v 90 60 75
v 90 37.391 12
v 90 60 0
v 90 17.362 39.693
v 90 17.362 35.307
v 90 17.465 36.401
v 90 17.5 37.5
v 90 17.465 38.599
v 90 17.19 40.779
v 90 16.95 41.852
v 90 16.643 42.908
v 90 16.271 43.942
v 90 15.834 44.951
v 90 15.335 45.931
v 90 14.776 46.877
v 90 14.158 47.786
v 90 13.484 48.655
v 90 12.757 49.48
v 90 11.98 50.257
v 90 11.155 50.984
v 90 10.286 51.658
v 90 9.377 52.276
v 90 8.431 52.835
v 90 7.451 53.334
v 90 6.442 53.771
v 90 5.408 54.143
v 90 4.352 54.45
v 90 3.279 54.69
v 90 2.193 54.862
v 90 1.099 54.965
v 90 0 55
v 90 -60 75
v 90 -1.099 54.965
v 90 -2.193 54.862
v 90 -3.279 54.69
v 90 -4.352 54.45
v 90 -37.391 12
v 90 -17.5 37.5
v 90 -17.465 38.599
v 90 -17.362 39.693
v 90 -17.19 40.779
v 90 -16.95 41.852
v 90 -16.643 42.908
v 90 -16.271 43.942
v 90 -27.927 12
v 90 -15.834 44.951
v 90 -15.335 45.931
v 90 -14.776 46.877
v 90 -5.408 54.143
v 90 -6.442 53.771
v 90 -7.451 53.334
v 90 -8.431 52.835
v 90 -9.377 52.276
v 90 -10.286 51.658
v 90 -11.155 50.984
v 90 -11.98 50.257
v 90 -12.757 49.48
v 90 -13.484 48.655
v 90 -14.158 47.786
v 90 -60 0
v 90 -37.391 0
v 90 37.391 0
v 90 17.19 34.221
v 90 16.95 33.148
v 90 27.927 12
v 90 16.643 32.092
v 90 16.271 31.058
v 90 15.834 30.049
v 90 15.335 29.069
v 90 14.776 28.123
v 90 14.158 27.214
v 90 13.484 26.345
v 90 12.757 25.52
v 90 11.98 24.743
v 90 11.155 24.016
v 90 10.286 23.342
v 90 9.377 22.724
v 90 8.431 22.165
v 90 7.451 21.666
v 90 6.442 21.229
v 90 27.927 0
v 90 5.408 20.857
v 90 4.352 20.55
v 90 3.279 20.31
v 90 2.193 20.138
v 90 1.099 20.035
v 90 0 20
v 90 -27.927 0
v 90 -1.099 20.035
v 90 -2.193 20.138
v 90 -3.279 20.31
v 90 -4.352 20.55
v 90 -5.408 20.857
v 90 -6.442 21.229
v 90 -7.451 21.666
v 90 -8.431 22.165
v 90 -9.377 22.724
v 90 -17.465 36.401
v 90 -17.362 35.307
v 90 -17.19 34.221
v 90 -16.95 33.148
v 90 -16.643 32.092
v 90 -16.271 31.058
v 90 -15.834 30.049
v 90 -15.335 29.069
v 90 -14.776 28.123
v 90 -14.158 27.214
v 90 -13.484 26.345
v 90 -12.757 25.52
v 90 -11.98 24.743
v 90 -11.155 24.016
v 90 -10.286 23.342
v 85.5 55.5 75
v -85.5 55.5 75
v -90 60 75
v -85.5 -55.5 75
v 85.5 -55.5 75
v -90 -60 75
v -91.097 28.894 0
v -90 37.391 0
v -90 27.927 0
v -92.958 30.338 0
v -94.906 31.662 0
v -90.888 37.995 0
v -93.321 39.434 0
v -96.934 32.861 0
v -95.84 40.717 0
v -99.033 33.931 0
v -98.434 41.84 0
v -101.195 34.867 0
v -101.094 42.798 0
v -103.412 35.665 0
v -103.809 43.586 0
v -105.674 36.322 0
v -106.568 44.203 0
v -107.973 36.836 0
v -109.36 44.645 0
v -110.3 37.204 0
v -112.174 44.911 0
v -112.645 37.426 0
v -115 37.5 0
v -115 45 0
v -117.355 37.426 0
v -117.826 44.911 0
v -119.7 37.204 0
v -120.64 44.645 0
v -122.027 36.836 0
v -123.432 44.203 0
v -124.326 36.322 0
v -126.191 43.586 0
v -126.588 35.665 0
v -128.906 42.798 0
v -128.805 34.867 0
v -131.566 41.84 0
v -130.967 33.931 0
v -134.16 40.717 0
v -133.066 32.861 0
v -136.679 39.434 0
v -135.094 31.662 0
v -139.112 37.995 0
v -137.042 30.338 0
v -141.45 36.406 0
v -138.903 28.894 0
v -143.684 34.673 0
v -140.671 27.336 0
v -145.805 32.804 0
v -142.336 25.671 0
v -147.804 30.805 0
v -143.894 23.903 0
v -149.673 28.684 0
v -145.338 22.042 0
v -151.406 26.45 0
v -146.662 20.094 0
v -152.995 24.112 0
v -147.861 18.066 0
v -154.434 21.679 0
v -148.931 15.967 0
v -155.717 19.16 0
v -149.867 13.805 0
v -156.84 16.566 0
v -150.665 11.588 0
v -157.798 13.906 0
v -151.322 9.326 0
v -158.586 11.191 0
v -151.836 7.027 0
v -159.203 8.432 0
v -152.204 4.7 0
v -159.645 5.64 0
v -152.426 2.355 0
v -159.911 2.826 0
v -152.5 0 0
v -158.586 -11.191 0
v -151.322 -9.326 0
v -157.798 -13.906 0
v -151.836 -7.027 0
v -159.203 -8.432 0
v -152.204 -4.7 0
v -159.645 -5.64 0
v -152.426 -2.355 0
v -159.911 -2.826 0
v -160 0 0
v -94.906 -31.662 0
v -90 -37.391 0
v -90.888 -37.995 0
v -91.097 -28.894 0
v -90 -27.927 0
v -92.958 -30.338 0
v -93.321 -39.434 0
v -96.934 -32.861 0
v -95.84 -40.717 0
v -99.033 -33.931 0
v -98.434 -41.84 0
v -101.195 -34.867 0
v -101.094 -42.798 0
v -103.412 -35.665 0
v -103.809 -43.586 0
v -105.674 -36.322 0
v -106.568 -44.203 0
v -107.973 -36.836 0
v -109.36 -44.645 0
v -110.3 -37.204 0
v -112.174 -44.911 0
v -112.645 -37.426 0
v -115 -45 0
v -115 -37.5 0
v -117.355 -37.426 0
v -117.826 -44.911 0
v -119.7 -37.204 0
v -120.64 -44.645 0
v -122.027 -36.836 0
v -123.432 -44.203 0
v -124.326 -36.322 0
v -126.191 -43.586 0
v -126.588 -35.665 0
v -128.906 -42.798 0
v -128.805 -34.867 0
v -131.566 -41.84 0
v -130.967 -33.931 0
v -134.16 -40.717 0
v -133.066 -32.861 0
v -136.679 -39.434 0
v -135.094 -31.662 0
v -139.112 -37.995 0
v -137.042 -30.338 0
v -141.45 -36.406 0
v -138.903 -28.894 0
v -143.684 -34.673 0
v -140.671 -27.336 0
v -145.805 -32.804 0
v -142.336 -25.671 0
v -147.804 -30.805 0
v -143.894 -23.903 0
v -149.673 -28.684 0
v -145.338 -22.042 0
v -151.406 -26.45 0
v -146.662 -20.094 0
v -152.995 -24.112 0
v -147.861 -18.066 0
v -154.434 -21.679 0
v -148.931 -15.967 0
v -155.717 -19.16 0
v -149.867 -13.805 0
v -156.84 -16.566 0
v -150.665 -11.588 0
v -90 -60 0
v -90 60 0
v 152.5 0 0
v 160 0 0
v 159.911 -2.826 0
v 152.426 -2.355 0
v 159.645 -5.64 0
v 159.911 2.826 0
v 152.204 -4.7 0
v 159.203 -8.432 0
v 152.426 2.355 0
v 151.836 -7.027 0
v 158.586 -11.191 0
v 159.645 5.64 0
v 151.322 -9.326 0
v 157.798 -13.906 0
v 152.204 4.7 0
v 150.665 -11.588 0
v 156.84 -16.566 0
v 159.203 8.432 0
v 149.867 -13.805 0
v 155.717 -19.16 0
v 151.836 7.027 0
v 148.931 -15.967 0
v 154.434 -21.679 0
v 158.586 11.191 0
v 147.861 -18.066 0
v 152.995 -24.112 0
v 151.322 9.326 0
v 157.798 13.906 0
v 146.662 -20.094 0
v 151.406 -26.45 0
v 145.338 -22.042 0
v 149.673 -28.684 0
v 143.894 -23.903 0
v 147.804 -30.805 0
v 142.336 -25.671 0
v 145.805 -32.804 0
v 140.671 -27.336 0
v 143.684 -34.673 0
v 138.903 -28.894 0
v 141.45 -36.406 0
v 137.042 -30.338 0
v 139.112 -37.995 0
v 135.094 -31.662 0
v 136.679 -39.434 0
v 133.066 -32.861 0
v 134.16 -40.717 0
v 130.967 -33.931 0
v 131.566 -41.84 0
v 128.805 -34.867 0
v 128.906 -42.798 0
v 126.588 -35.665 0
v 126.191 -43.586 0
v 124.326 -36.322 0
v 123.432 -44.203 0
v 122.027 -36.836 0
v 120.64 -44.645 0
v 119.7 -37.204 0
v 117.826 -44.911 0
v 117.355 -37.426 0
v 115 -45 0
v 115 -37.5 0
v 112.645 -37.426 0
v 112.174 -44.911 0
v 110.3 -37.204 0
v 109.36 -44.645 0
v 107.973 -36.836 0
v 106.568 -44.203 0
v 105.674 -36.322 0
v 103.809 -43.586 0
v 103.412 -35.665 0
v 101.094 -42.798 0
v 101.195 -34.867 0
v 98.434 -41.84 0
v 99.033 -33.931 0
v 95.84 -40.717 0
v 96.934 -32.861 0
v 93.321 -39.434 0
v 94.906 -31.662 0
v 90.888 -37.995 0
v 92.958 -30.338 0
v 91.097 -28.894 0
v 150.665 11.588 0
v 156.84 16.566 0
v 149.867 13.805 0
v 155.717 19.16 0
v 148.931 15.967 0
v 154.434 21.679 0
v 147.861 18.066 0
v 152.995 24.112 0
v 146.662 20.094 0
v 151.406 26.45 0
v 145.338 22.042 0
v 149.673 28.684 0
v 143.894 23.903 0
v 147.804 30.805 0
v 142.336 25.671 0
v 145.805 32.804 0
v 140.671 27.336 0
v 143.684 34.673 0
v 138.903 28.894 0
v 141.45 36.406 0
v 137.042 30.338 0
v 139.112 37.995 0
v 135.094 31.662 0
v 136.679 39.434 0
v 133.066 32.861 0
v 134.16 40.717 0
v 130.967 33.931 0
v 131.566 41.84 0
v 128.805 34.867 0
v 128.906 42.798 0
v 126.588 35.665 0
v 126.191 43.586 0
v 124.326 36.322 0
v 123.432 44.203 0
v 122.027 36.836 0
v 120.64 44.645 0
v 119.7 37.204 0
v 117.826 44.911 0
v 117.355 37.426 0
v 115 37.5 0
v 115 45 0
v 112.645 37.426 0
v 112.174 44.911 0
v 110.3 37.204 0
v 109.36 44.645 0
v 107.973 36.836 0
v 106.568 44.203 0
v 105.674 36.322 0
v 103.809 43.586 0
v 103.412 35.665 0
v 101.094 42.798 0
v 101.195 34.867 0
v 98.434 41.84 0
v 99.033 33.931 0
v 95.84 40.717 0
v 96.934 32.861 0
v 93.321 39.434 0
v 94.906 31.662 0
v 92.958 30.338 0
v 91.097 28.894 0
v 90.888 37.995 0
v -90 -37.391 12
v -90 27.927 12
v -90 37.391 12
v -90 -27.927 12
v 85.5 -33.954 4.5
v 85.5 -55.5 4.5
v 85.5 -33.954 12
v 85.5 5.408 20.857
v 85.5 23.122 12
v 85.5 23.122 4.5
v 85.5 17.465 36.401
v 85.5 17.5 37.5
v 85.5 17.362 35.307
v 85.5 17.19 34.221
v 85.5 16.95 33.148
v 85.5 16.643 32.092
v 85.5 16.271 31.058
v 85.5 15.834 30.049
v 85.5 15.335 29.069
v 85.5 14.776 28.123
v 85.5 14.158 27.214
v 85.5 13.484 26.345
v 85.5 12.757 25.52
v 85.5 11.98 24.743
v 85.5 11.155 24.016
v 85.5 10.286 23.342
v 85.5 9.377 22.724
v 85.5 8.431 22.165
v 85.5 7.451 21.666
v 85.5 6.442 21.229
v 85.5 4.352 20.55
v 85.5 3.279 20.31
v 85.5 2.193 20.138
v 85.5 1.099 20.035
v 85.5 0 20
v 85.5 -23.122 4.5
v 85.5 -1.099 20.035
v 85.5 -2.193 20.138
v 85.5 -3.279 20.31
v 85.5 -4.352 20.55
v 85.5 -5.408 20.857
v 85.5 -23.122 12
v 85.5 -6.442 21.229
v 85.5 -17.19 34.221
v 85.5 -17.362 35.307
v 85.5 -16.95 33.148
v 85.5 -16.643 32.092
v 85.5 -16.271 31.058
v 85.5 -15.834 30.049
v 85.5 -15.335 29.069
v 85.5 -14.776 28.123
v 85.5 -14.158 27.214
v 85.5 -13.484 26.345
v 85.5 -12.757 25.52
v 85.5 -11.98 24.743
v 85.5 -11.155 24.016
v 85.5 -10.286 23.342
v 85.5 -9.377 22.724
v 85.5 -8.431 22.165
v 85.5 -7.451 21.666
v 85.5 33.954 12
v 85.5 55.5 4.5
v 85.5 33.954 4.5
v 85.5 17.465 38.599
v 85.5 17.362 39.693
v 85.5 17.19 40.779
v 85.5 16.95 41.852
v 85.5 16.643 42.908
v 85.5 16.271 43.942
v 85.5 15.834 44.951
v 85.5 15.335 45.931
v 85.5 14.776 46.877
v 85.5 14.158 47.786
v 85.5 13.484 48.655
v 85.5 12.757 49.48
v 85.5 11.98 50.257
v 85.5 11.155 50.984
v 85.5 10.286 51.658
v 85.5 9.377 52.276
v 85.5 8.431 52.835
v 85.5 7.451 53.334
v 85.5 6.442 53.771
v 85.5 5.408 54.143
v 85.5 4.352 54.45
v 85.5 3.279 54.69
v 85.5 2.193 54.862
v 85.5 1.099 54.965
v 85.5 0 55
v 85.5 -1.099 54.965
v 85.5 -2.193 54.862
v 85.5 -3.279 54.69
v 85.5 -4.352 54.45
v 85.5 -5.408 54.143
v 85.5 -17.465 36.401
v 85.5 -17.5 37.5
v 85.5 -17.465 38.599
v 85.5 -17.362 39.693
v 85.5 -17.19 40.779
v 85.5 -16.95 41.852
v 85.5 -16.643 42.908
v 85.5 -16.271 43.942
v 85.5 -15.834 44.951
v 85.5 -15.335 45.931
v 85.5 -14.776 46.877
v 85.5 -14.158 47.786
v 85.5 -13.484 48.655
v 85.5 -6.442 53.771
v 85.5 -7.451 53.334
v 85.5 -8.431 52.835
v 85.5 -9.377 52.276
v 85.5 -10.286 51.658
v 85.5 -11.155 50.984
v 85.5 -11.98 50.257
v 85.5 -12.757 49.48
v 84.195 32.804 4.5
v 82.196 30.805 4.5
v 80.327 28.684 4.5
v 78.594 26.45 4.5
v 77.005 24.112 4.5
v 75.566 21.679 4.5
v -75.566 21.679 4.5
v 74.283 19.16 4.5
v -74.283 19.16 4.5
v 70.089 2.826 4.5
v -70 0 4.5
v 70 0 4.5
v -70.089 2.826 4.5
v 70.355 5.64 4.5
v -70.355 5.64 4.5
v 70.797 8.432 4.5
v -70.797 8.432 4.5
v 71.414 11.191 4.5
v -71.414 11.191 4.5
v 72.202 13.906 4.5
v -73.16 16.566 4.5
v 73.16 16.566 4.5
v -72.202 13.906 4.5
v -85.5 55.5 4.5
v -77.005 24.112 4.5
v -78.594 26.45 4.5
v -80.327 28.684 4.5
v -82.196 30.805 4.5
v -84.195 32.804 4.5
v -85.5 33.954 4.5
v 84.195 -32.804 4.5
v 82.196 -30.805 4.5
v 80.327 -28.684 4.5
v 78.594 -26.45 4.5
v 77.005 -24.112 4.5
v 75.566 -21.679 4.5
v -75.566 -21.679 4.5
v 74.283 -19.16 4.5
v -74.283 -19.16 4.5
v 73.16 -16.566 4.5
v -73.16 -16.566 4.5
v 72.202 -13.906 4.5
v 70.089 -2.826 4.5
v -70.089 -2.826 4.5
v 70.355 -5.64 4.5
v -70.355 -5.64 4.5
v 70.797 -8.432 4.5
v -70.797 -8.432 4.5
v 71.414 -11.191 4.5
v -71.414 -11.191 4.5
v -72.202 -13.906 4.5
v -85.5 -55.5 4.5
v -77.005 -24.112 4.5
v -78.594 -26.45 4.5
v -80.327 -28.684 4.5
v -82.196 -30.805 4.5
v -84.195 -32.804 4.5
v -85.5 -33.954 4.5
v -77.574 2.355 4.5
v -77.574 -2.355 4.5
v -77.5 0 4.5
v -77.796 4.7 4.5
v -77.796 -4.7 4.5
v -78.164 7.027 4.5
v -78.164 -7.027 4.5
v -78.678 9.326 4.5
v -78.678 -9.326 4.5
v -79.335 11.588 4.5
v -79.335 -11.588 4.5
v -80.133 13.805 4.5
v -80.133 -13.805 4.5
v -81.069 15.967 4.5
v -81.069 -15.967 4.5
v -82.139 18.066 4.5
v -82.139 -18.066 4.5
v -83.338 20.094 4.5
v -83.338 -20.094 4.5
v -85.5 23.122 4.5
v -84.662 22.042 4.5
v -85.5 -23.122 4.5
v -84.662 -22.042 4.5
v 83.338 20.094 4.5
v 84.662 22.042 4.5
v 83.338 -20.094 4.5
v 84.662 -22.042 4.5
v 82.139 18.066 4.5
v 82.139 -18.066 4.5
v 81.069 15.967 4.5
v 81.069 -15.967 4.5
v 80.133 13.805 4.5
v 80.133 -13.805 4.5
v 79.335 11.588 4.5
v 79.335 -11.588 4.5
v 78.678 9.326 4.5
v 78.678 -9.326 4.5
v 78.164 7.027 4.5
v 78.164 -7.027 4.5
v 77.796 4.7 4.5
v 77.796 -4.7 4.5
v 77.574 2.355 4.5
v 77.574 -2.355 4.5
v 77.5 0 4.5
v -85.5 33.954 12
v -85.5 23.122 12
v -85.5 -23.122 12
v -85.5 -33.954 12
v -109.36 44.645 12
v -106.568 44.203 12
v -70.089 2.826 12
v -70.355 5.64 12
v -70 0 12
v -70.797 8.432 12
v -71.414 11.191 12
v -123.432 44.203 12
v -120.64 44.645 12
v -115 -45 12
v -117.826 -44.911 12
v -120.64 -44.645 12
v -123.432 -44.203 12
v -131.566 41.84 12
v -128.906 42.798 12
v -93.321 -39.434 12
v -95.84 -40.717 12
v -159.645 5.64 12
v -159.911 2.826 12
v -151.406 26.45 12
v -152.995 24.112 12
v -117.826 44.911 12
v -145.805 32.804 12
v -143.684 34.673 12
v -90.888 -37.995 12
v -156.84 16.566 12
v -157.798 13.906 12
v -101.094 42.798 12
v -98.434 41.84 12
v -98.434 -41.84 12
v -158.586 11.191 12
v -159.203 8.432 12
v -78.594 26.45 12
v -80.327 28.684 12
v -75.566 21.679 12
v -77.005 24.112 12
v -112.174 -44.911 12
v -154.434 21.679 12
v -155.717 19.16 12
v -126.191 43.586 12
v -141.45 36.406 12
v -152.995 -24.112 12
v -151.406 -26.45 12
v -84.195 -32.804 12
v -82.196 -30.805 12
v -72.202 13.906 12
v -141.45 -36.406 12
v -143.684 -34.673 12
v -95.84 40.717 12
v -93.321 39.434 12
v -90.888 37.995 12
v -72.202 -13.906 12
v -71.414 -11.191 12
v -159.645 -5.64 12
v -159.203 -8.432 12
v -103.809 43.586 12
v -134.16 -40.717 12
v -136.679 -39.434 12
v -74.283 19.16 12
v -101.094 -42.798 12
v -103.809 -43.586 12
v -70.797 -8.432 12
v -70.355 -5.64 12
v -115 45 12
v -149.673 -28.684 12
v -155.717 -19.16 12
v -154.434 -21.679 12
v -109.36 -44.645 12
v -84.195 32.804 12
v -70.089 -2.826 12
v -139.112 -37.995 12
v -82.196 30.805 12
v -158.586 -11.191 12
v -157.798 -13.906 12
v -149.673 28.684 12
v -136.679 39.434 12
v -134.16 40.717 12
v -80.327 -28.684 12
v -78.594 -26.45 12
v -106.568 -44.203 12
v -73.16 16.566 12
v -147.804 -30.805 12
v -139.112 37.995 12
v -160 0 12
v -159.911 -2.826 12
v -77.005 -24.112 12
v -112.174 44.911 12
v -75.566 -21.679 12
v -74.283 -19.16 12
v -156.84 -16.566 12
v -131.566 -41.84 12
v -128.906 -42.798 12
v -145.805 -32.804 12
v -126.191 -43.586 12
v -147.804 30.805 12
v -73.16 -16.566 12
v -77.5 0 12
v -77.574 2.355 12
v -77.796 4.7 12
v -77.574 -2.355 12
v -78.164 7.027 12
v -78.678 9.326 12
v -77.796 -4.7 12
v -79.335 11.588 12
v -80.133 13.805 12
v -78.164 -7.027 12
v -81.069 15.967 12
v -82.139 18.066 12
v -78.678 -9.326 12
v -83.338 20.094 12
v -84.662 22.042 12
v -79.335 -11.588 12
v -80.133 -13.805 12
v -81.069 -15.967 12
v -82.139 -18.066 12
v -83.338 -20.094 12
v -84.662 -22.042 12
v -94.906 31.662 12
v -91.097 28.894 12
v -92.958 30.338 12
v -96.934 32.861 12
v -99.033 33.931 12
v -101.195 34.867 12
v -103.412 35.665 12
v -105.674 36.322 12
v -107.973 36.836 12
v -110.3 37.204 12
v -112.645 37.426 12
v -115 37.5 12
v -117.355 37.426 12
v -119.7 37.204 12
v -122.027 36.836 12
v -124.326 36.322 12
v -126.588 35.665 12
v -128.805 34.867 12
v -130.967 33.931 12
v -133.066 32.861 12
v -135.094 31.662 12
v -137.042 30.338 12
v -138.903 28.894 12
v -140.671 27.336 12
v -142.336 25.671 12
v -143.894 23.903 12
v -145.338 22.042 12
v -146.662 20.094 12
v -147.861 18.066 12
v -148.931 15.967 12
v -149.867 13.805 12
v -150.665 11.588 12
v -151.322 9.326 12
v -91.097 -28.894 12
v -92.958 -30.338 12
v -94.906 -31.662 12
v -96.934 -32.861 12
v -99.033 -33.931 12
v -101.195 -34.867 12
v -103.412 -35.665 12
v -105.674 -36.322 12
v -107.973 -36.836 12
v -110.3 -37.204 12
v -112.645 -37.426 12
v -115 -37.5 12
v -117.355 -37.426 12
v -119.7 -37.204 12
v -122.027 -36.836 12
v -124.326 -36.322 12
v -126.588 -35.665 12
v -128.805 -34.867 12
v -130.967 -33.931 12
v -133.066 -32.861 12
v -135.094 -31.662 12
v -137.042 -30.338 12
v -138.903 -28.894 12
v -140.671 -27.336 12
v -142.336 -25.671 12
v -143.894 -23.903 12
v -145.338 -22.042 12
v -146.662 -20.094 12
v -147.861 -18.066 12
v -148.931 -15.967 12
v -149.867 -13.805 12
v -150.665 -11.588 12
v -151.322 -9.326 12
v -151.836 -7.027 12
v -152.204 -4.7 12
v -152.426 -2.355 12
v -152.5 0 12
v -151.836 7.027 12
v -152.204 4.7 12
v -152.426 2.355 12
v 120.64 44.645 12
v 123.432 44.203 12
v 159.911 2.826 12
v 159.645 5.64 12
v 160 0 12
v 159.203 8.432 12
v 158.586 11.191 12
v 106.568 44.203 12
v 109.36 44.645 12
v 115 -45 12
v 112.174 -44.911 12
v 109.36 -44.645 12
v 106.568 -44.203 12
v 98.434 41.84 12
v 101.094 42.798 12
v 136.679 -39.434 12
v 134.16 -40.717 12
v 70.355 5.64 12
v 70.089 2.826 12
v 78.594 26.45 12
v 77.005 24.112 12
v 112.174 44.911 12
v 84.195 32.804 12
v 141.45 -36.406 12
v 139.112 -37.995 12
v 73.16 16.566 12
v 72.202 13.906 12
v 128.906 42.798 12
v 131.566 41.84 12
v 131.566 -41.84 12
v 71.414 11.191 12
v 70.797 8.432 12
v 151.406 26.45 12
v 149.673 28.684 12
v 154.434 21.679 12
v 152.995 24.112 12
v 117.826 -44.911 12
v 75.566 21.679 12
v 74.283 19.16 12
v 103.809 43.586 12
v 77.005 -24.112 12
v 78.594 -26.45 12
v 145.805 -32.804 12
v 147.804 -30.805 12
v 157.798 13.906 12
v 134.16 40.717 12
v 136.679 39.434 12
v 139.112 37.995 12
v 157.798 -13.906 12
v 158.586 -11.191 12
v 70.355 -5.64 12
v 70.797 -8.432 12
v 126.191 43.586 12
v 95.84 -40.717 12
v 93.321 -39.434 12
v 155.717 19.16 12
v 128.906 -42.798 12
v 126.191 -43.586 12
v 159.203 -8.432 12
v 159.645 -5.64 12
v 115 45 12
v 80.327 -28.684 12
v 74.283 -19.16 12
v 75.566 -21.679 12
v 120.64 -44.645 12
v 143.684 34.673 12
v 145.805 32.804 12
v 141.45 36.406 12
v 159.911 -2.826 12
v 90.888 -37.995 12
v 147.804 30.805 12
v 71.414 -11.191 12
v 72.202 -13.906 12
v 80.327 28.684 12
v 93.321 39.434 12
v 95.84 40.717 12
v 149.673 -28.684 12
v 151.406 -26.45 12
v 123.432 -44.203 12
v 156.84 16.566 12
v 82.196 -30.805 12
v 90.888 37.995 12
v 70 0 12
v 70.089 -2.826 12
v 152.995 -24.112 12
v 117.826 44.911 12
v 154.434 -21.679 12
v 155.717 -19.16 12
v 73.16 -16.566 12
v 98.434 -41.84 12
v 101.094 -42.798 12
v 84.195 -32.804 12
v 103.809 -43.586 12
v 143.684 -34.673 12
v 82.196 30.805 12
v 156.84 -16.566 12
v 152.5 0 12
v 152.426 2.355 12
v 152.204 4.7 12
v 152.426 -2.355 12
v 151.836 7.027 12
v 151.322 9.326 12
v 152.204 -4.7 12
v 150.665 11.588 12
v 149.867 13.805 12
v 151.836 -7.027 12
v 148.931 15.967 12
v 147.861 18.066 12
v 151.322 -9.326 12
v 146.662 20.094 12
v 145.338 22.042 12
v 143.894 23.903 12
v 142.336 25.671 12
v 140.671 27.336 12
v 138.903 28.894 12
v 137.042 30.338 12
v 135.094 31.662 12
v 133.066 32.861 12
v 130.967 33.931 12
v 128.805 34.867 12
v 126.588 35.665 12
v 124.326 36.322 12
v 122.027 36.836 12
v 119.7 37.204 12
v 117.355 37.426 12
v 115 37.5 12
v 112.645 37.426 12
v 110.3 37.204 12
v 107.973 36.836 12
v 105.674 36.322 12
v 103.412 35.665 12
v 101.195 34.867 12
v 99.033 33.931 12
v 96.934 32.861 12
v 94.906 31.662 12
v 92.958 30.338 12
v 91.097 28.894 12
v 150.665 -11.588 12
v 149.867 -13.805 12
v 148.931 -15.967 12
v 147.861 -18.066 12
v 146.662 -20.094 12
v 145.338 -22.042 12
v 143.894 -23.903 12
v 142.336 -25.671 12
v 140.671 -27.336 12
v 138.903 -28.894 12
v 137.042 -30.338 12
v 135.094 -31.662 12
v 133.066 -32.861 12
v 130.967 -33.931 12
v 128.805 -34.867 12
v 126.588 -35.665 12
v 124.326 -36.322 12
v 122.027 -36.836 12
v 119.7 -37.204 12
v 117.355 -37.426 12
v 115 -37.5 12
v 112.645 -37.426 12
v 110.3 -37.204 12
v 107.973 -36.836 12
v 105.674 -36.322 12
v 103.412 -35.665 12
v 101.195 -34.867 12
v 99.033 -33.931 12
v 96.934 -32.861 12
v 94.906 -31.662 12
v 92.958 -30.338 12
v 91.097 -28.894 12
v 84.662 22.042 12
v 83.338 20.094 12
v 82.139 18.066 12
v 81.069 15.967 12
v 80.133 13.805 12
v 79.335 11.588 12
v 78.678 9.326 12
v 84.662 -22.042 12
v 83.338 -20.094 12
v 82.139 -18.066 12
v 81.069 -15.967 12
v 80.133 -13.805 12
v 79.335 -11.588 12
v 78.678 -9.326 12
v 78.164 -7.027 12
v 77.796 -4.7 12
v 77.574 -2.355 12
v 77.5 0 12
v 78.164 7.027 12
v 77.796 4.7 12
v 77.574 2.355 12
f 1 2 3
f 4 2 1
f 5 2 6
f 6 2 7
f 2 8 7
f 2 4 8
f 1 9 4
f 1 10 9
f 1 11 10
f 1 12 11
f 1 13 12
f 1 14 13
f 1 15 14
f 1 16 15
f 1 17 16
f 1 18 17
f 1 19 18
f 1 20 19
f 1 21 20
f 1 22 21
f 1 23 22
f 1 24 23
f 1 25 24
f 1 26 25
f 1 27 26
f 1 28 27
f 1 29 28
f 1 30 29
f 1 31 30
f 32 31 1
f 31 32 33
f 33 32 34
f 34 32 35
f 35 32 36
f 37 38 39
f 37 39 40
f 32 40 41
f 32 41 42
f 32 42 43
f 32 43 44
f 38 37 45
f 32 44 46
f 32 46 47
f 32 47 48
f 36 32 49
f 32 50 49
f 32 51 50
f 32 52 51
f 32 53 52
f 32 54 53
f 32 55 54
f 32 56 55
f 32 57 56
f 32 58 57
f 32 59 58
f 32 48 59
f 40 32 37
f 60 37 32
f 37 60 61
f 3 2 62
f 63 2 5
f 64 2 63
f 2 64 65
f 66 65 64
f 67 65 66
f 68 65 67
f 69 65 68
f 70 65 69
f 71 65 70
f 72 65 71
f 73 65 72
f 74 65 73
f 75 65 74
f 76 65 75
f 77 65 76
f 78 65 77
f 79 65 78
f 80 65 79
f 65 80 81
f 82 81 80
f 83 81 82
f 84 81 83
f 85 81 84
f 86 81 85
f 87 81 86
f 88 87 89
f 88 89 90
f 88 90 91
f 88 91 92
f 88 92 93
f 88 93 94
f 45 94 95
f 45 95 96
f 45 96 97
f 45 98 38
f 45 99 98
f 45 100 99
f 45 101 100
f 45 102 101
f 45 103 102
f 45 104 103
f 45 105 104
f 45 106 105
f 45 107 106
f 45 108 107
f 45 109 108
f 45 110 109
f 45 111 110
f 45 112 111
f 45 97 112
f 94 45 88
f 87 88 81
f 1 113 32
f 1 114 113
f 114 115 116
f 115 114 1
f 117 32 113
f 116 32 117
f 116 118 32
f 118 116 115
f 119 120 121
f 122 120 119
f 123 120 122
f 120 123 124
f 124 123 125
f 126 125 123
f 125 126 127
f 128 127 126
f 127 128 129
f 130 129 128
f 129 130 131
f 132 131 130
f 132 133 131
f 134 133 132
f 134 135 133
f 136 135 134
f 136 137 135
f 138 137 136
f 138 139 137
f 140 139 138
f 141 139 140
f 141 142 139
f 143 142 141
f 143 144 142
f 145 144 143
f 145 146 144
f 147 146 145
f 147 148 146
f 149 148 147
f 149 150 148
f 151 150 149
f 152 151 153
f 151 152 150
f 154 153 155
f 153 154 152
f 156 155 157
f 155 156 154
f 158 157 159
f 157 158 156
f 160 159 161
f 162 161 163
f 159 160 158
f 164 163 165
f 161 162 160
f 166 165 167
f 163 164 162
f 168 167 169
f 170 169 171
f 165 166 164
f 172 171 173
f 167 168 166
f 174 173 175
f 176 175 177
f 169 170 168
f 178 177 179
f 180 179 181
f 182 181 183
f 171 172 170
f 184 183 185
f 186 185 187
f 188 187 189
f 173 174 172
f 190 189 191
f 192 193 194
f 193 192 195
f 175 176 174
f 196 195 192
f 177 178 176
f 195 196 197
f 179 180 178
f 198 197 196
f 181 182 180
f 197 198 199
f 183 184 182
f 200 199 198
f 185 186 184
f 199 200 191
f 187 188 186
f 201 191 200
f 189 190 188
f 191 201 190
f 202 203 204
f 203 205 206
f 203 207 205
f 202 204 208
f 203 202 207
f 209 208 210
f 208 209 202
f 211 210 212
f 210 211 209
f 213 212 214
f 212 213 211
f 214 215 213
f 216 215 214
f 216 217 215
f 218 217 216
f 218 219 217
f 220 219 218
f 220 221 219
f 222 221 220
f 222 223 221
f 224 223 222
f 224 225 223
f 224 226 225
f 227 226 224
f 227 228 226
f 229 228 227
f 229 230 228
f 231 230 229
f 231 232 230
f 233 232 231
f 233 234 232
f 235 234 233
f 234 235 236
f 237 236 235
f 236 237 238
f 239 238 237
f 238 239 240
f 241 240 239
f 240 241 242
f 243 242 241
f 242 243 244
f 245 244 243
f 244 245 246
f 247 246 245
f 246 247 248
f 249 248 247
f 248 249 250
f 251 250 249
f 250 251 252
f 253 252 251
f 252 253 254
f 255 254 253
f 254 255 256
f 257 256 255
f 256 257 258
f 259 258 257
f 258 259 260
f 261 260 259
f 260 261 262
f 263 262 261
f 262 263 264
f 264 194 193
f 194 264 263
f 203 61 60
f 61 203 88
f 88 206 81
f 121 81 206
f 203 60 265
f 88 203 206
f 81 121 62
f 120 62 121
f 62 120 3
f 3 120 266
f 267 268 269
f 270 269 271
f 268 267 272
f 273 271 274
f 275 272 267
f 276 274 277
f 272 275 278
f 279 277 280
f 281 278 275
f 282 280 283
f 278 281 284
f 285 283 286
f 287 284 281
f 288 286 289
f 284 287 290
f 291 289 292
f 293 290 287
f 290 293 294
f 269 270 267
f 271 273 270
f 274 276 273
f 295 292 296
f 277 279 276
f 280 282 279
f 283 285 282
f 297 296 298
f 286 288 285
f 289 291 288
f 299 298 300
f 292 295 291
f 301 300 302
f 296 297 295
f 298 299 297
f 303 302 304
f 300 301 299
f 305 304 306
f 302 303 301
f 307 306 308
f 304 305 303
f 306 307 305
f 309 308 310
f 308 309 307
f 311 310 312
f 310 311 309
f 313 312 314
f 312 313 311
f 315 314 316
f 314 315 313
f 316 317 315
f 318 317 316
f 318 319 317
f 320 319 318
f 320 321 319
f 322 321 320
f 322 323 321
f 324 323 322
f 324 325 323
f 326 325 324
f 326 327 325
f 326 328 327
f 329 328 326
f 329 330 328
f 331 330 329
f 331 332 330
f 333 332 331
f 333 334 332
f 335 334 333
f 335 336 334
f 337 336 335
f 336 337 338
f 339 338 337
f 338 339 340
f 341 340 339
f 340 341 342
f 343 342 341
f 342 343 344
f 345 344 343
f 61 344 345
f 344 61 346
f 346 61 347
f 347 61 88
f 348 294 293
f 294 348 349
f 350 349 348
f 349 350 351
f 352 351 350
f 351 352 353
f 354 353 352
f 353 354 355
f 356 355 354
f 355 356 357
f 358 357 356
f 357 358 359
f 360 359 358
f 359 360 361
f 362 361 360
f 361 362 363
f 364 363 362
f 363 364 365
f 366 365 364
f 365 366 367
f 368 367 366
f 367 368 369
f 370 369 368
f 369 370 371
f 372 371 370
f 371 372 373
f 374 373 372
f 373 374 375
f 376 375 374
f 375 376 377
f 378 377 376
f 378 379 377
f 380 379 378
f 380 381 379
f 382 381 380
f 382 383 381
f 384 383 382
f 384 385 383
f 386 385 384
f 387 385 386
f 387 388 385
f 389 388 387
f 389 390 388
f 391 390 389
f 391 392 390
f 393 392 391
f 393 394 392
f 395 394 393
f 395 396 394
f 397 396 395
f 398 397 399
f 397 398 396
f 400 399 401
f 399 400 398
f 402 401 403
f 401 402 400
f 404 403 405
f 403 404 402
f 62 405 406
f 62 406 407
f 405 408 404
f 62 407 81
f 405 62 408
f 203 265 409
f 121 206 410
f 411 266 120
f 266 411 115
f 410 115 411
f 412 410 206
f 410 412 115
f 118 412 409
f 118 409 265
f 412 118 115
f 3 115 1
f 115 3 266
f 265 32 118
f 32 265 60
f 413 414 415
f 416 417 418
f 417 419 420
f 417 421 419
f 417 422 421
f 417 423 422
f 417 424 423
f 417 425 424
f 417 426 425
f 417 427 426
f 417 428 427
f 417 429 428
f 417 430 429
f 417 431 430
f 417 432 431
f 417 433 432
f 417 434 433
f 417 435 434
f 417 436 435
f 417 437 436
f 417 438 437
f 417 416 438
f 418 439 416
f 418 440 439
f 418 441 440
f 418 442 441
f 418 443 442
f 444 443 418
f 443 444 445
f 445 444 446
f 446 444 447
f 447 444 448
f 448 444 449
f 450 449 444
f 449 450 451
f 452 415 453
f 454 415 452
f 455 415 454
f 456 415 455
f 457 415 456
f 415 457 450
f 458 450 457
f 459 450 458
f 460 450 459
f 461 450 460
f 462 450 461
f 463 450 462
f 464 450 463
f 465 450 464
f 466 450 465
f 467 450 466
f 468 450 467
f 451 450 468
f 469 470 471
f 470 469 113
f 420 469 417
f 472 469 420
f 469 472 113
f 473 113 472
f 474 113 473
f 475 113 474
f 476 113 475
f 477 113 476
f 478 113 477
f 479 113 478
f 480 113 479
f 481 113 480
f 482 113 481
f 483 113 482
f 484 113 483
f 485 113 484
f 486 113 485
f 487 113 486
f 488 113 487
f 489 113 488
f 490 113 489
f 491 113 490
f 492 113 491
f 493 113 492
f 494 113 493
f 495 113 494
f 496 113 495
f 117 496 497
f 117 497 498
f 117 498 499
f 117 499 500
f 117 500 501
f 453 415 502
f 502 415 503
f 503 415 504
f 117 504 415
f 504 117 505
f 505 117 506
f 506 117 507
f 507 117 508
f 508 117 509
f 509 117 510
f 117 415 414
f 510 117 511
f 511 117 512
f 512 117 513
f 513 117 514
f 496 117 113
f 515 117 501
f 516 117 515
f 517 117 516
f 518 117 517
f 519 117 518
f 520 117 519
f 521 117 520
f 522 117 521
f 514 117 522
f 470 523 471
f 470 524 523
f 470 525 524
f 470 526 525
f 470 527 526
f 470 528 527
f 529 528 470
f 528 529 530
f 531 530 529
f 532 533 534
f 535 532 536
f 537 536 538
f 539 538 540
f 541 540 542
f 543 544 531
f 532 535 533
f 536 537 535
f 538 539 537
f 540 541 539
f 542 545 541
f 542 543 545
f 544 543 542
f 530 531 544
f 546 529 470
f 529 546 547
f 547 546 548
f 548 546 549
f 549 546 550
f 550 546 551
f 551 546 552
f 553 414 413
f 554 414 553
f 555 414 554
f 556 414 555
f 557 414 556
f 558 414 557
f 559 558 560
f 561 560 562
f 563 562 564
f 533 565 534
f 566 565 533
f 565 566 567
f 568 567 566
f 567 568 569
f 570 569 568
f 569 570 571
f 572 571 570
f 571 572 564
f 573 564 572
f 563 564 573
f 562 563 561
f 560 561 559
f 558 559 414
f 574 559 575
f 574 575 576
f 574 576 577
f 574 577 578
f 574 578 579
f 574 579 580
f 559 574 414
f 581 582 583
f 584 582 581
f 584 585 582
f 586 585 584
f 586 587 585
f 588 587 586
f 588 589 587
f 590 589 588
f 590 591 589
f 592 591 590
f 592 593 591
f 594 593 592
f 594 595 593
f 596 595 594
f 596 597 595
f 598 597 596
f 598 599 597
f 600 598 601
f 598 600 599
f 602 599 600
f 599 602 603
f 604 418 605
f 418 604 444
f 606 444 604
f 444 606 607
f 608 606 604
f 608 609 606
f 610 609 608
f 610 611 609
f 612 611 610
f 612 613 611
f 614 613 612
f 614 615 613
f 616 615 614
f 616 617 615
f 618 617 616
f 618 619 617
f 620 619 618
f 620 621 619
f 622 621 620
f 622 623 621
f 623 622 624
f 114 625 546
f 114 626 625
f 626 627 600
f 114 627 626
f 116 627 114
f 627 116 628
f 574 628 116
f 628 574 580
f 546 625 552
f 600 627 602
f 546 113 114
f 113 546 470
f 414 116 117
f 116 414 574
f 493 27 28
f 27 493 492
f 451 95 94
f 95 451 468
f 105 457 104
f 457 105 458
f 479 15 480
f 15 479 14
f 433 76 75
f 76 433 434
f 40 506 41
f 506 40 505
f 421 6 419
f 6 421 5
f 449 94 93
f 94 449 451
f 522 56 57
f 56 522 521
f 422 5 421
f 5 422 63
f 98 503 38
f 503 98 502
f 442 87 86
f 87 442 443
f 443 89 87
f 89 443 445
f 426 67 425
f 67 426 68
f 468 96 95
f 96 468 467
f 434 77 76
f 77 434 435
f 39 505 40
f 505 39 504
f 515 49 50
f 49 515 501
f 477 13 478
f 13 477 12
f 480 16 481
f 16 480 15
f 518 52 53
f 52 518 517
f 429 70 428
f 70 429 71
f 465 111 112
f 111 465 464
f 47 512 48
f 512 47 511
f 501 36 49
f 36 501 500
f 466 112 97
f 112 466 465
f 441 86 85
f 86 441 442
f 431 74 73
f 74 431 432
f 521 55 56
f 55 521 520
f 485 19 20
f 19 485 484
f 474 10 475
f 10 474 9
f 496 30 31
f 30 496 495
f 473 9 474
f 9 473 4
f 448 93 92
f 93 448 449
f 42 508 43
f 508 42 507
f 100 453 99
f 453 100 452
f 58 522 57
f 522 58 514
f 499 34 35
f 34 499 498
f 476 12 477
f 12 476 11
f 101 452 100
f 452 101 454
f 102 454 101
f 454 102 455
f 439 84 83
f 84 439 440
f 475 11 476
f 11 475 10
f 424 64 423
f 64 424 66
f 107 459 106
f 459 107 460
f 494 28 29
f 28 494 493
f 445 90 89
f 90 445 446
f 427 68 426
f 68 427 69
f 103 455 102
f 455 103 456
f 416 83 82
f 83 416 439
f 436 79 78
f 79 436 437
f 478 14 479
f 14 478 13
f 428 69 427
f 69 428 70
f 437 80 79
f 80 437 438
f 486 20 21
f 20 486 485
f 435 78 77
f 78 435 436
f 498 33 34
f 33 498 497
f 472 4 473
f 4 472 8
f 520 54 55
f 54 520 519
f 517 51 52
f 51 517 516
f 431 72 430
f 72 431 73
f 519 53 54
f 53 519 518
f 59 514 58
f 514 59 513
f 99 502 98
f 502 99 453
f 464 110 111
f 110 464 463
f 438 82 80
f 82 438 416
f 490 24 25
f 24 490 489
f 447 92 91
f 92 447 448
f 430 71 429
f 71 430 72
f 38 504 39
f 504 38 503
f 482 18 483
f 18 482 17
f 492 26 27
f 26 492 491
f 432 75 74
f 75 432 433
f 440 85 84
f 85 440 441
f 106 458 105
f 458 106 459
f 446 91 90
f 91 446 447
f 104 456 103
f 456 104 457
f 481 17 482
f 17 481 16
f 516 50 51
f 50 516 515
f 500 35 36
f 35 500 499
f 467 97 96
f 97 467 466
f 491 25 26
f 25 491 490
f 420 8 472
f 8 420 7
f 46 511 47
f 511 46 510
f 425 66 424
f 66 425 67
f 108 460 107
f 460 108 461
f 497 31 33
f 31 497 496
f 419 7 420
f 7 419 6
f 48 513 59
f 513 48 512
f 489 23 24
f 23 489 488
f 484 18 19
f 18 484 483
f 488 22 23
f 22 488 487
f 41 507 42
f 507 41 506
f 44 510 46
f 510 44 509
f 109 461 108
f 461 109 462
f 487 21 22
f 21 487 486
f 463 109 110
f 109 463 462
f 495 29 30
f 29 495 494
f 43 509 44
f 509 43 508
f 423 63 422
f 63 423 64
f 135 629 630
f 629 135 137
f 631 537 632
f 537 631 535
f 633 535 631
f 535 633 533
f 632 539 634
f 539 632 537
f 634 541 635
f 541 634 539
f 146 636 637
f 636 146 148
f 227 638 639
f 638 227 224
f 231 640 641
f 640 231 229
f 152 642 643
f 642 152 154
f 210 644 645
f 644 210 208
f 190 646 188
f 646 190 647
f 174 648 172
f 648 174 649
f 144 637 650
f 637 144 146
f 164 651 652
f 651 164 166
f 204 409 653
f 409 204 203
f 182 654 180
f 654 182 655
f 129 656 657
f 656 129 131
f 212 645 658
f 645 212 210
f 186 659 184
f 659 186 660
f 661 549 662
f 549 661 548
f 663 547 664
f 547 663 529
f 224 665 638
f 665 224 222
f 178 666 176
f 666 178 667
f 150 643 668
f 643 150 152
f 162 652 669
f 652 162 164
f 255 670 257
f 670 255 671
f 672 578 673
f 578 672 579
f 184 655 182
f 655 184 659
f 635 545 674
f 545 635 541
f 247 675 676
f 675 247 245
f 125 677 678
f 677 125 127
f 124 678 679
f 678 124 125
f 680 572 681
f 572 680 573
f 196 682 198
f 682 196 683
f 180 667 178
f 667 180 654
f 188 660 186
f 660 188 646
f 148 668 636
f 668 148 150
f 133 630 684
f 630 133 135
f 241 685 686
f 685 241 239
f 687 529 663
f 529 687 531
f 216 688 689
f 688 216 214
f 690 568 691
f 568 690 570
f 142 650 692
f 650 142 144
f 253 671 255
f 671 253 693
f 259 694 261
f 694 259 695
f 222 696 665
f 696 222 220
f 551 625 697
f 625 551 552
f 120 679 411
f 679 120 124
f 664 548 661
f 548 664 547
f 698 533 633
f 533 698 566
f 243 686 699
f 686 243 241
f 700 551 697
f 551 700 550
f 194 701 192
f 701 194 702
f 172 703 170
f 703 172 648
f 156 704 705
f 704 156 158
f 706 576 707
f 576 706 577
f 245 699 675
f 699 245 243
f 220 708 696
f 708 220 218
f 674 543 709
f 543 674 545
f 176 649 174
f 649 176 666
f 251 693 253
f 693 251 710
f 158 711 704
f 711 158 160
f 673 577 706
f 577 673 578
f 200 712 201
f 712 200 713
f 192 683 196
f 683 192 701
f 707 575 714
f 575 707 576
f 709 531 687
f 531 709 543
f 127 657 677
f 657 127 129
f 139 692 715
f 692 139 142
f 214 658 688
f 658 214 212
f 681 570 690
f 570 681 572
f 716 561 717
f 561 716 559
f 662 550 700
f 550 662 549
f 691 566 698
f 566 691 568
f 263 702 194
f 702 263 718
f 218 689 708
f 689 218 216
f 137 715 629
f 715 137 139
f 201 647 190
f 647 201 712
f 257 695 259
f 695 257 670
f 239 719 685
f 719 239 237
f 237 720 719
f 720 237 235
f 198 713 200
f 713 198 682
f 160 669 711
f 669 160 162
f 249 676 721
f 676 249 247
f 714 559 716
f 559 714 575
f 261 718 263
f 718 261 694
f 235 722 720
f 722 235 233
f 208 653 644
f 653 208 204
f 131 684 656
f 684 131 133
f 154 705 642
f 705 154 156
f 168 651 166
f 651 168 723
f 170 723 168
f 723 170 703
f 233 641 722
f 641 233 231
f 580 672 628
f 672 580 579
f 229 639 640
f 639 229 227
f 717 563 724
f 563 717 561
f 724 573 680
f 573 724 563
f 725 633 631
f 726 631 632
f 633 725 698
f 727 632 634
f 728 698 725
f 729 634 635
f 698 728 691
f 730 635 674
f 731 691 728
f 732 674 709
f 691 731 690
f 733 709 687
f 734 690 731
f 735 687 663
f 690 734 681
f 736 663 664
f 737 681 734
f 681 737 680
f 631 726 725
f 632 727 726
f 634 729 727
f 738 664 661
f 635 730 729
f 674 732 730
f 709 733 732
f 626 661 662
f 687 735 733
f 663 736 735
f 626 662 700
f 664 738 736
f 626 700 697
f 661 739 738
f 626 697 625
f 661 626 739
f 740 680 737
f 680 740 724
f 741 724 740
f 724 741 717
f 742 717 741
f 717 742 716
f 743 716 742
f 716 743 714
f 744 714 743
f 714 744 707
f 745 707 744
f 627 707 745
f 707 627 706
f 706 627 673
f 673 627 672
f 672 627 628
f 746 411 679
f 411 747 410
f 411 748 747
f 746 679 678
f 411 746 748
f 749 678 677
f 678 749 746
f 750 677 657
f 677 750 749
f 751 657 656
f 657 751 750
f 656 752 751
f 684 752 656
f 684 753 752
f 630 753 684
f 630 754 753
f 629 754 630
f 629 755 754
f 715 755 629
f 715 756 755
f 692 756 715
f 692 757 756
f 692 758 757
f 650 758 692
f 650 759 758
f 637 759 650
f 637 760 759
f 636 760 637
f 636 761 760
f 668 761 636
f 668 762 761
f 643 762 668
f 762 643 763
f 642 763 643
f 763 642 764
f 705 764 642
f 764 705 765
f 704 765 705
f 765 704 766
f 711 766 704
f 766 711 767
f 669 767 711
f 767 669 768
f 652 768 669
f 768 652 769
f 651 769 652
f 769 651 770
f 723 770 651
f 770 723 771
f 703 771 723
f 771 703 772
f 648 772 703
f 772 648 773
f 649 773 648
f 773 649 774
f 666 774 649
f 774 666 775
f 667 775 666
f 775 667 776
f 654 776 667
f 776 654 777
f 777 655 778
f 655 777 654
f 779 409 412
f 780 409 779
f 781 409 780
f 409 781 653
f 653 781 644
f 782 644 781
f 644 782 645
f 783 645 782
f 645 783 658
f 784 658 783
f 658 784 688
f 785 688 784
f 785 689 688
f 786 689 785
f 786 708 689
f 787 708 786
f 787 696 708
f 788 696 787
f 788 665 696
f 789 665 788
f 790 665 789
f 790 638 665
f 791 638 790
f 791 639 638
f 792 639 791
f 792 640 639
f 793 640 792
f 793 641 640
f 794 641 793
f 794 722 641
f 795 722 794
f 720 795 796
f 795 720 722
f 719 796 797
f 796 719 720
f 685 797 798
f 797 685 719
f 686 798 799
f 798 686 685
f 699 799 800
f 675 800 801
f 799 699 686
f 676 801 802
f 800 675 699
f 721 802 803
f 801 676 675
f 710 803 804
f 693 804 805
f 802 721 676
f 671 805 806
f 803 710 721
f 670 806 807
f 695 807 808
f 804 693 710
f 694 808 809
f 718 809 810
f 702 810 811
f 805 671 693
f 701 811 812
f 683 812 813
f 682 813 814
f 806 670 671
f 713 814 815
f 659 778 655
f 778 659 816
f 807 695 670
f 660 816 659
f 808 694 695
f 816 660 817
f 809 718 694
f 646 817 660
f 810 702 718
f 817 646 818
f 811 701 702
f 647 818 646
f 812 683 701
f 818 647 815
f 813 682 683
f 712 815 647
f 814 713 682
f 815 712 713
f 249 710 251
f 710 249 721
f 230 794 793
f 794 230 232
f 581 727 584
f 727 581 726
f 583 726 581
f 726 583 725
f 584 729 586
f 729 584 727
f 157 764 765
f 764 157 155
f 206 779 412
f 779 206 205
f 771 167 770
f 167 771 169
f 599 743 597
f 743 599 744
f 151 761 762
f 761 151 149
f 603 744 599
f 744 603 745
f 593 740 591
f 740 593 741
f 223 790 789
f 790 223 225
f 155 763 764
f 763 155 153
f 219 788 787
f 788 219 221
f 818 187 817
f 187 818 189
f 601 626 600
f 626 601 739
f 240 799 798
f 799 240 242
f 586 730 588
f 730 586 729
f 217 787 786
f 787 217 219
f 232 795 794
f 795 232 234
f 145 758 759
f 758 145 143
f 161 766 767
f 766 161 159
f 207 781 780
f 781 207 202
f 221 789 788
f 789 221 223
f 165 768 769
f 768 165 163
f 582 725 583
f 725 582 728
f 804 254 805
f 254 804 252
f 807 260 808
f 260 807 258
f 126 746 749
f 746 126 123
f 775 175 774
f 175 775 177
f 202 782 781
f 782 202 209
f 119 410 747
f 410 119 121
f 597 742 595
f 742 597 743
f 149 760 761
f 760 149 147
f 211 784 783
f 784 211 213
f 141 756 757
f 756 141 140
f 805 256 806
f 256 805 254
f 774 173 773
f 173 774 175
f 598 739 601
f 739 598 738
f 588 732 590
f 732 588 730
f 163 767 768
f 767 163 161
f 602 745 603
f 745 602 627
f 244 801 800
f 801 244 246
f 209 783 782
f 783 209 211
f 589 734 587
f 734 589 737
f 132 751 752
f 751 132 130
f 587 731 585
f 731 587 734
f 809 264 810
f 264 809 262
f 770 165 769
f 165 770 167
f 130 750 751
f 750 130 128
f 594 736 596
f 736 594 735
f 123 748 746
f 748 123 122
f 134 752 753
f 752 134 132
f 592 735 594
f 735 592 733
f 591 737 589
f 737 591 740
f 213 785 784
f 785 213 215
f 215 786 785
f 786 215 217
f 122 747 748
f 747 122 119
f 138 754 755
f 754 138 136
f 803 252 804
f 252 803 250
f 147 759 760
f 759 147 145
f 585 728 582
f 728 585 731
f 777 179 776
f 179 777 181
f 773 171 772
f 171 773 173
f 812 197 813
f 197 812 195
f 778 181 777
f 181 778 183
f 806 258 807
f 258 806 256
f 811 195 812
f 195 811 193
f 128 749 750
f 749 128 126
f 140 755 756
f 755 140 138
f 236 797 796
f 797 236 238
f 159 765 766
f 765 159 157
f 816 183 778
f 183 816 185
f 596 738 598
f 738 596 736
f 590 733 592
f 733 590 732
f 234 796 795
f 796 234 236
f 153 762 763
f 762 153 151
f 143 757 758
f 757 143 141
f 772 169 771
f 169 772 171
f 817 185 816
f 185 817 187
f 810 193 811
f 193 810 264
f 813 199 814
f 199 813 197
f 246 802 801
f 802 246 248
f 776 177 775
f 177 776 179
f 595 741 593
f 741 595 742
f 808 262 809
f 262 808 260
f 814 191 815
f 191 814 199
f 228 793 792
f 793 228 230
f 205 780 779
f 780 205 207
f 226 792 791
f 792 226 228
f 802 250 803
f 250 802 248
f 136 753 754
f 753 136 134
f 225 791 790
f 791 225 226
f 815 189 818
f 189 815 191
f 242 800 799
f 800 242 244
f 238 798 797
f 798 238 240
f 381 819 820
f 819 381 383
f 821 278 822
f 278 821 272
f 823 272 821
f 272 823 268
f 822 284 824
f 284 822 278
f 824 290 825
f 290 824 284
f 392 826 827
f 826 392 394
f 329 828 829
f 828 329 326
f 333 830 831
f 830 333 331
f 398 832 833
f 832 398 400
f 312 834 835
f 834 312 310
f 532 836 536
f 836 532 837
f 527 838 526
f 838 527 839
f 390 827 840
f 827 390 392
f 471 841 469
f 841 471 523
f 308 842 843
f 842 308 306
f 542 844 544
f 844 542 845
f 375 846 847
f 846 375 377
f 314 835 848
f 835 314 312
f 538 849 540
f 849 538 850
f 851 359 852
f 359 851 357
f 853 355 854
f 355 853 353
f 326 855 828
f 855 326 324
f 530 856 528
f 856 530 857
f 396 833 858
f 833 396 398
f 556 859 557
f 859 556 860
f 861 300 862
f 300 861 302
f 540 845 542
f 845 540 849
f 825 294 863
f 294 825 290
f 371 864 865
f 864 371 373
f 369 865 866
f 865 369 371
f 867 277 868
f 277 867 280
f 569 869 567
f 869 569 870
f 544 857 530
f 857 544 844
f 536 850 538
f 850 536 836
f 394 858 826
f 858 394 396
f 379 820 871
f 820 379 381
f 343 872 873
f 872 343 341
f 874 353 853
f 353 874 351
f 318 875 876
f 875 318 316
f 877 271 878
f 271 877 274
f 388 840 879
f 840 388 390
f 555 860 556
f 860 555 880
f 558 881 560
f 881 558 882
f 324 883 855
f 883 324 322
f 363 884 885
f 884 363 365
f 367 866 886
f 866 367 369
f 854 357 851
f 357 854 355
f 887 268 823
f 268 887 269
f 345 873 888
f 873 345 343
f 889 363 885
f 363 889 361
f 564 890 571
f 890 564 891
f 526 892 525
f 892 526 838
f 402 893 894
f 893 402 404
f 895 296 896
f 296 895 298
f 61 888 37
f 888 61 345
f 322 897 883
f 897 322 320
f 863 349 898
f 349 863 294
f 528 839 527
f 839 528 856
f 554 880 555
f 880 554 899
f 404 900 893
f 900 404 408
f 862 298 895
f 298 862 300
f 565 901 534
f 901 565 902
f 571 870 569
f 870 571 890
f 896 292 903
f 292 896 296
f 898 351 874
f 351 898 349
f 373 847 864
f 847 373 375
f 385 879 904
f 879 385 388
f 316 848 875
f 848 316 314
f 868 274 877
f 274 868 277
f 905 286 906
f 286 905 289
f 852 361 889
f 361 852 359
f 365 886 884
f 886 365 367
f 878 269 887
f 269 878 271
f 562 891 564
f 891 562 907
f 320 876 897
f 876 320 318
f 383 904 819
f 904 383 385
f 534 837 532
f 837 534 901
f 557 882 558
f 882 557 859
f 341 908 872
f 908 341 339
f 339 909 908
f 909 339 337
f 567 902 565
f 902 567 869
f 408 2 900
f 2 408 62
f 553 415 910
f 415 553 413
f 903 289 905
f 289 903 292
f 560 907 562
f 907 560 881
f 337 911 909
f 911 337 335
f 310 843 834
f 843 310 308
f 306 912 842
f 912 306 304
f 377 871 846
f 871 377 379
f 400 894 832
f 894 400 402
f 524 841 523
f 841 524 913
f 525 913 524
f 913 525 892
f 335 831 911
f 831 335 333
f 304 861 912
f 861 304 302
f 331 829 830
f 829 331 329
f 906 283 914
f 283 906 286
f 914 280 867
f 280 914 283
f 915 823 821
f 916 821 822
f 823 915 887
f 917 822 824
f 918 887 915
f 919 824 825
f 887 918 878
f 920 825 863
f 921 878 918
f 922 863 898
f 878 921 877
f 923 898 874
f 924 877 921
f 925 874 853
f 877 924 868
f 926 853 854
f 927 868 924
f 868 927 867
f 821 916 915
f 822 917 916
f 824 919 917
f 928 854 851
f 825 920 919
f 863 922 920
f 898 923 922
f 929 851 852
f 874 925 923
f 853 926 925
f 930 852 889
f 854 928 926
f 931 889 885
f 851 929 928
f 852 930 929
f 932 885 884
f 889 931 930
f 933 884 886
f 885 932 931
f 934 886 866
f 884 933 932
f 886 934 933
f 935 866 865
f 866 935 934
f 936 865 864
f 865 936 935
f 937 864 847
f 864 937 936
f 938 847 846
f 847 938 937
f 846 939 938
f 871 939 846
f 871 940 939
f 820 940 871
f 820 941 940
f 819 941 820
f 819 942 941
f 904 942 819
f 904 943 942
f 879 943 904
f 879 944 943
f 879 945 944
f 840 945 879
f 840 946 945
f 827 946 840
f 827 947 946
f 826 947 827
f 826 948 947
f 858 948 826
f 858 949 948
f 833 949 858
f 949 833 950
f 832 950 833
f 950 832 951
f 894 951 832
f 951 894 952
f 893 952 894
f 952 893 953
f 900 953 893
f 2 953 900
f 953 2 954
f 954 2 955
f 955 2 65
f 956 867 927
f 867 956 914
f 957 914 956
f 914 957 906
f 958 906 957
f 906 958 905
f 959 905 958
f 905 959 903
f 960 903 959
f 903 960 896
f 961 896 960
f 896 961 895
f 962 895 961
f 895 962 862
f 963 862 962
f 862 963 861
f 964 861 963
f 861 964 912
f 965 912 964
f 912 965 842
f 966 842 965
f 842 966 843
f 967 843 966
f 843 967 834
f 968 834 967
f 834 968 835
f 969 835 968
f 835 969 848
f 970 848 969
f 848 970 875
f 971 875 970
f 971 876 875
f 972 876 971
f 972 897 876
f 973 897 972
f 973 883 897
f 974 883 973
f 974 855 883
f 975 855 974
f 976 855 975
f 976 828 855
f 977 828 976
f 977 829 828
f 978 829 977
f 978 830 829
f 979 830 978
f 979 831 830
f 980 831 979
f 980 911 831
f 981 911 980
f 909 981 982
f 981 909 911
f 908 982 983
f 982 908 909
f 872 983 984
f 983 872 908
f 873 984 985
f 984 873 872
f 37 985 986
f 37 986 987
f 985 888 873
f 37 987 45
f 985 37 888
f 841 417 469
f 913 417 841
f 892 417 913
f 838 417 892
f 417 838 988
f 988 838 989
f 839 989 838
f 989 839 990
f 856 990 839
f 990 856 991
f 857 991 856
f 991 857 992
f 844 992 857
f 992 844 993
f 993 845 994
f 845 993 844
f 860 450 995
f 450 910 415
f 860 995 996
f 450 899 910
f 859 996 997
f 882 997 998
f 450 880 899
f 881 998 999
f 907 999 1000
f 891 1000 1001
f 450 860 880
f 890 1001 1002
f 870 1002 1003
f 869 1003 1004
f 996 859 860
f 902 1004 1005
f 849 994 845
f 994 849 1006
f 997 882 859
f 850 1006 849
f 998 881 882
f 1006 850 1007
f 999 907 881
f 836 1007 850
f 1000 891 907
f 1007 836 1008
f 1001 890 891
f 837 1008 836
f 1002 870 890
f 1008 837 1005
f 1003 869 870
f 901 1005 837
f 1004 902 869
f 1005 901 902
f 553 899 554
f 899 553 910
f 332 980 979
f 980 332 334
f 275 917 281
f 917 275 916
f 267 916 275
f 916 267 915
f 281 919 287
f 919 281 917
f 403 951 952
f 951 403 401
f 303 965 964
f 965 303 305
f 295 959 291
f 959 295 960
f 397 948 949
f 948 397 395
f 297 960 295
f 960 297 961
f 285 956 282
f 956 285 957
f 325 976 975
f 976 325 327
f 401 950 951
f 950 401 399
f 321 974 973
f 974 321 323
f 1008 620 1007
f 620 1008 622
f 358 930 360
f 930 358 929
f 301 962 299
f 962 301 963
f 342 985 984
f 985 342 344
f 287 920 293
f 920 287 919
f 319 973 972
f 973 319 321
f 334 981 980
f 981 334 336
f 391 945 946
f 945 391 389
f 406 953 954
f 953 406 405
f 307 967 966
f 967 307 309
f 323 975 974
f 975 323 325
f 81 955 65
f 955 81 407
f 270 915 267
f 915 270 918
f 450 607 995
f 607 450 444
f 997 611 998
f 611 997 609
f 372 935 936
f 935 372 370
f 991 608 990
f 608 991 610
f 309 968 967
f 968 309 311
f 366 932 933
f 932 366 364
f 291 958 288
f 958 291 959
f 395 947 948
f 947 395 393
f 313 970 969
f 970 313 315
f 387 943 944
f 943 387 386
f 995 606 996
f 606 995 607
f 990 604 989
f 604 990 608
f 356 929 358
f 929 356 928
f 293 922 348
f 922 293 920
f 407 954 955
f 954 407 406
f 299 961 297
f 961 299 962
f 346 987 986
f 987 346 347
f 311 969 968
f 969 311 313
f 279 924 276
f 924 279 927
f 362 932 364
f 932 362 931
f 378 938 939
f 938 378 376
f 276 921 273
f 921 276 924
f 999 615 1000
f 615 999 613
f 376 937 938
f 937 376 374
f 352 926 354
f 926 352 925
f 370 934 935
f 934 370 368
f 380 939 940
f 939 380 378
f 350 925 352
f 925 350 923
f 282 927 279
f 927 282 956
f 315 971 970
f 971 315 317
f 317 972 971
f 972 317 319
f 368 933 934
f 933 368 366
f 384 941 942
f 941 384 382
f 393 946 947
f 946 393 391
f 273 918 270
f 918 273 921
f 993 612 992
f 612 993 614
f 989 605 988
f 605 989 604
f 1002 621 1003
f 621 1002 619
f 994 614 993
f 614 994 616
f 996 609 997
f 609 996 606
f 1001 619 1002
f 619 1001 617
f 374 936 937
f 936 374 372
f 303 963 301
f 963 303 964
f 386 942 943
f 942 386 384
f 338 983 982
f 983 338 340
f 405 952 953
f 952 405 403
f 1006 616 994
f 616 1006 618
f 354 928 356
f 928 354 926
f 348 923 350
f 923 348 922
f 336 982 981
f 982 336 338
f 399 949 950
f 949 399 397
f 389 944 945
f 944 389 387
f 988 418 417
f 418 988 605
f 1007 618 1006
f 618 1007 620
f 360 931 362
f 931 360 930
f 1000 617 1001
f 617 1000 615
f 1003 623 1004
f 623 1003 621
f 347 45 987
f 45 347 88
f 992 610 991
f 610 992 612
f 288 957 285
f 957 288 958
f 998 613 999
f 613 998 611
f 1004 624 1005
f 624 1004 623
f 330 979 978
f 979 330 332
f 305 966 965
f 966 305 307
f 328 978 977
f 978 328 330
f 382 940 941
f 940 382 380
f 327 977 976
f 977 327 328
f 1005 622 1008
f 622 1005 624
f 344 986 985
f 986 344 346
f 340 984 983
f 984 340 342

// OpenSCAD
// ====================================================================================
// REVOLUTIONARY TECHNOLOGY COMPANY & UNIVERSITY OF WASHINGTON DEPARTMENT OF PHYSICS
// Module: dash_power_housing.scad (Avionics Isolated Cockpit Power Enclosure)
// Objective: Secure mechanical casing protecting the low-voltage master dash bus
// Center Origin (0,0,0) = Enclosure Base Geometrical Center
// ====================================================================================

$fn = 100; // CNC milling optimization finish parameters

// --- Parametric Enclosure Dimensions (mm) ---
box_length        = 180.00;
box_width         = 120.00;
box_height        = 75.00;
wall_thickness    = 4.50;  // Ruggedized enclosure thickness shielding cross-talk
cushion_register_d= 75.00; // Tailored mount register matching shocks.scad rubber cores

module master_avionics_enclosure() {
    difference() {
        // Outer raw protective enclosure brick
        translate([-box_length/2, -box_width/2, 0])
            cube([box_length, box_width, box_height]);
        
        // Internal component cavity mapping out assembly clearance space
        translate([-box_length/2 + wall_thickness, -box_width/2 + wall_thickness, wall_thickness])
            cube([box_length - (2*wall_thickness), box_width - (2*wall_thickness), box_height]);
            
        // Pre-drilled threaded wire exit portal for the upcoming custom dash harness
        translate([box_length/2 - 2, 0, box_height/2])
            rotate([0, 90, 0])
                cylinder(d=35.0, h=wall_thickness + 6, center=true); // Clears custom conduit sleeves
    }
}

module shock_isolation_mount_lugs() {
    // Generates left and right mounting ears that lock into your global rubber dampening cages
    for (side = [-1, 1]) {
        translate([side * (box_length/2 + 25), 0, 0]) {
            difference() {
                // Structural aluminum lug ear flange
                cylinder(d=cushion_register_d + 15, h=12, center=false);
                // Center borehole through which the rubber shock absorber isolator locks
                translate()
                    cylinder(d=cushion_register_d, h=14, center=false);
            }
        }
    }
}

// --- Composite Architecture Instantiation ---
union() {
    master_avionics_enclosure();
    shock_isolation_mount_lugs();
}
